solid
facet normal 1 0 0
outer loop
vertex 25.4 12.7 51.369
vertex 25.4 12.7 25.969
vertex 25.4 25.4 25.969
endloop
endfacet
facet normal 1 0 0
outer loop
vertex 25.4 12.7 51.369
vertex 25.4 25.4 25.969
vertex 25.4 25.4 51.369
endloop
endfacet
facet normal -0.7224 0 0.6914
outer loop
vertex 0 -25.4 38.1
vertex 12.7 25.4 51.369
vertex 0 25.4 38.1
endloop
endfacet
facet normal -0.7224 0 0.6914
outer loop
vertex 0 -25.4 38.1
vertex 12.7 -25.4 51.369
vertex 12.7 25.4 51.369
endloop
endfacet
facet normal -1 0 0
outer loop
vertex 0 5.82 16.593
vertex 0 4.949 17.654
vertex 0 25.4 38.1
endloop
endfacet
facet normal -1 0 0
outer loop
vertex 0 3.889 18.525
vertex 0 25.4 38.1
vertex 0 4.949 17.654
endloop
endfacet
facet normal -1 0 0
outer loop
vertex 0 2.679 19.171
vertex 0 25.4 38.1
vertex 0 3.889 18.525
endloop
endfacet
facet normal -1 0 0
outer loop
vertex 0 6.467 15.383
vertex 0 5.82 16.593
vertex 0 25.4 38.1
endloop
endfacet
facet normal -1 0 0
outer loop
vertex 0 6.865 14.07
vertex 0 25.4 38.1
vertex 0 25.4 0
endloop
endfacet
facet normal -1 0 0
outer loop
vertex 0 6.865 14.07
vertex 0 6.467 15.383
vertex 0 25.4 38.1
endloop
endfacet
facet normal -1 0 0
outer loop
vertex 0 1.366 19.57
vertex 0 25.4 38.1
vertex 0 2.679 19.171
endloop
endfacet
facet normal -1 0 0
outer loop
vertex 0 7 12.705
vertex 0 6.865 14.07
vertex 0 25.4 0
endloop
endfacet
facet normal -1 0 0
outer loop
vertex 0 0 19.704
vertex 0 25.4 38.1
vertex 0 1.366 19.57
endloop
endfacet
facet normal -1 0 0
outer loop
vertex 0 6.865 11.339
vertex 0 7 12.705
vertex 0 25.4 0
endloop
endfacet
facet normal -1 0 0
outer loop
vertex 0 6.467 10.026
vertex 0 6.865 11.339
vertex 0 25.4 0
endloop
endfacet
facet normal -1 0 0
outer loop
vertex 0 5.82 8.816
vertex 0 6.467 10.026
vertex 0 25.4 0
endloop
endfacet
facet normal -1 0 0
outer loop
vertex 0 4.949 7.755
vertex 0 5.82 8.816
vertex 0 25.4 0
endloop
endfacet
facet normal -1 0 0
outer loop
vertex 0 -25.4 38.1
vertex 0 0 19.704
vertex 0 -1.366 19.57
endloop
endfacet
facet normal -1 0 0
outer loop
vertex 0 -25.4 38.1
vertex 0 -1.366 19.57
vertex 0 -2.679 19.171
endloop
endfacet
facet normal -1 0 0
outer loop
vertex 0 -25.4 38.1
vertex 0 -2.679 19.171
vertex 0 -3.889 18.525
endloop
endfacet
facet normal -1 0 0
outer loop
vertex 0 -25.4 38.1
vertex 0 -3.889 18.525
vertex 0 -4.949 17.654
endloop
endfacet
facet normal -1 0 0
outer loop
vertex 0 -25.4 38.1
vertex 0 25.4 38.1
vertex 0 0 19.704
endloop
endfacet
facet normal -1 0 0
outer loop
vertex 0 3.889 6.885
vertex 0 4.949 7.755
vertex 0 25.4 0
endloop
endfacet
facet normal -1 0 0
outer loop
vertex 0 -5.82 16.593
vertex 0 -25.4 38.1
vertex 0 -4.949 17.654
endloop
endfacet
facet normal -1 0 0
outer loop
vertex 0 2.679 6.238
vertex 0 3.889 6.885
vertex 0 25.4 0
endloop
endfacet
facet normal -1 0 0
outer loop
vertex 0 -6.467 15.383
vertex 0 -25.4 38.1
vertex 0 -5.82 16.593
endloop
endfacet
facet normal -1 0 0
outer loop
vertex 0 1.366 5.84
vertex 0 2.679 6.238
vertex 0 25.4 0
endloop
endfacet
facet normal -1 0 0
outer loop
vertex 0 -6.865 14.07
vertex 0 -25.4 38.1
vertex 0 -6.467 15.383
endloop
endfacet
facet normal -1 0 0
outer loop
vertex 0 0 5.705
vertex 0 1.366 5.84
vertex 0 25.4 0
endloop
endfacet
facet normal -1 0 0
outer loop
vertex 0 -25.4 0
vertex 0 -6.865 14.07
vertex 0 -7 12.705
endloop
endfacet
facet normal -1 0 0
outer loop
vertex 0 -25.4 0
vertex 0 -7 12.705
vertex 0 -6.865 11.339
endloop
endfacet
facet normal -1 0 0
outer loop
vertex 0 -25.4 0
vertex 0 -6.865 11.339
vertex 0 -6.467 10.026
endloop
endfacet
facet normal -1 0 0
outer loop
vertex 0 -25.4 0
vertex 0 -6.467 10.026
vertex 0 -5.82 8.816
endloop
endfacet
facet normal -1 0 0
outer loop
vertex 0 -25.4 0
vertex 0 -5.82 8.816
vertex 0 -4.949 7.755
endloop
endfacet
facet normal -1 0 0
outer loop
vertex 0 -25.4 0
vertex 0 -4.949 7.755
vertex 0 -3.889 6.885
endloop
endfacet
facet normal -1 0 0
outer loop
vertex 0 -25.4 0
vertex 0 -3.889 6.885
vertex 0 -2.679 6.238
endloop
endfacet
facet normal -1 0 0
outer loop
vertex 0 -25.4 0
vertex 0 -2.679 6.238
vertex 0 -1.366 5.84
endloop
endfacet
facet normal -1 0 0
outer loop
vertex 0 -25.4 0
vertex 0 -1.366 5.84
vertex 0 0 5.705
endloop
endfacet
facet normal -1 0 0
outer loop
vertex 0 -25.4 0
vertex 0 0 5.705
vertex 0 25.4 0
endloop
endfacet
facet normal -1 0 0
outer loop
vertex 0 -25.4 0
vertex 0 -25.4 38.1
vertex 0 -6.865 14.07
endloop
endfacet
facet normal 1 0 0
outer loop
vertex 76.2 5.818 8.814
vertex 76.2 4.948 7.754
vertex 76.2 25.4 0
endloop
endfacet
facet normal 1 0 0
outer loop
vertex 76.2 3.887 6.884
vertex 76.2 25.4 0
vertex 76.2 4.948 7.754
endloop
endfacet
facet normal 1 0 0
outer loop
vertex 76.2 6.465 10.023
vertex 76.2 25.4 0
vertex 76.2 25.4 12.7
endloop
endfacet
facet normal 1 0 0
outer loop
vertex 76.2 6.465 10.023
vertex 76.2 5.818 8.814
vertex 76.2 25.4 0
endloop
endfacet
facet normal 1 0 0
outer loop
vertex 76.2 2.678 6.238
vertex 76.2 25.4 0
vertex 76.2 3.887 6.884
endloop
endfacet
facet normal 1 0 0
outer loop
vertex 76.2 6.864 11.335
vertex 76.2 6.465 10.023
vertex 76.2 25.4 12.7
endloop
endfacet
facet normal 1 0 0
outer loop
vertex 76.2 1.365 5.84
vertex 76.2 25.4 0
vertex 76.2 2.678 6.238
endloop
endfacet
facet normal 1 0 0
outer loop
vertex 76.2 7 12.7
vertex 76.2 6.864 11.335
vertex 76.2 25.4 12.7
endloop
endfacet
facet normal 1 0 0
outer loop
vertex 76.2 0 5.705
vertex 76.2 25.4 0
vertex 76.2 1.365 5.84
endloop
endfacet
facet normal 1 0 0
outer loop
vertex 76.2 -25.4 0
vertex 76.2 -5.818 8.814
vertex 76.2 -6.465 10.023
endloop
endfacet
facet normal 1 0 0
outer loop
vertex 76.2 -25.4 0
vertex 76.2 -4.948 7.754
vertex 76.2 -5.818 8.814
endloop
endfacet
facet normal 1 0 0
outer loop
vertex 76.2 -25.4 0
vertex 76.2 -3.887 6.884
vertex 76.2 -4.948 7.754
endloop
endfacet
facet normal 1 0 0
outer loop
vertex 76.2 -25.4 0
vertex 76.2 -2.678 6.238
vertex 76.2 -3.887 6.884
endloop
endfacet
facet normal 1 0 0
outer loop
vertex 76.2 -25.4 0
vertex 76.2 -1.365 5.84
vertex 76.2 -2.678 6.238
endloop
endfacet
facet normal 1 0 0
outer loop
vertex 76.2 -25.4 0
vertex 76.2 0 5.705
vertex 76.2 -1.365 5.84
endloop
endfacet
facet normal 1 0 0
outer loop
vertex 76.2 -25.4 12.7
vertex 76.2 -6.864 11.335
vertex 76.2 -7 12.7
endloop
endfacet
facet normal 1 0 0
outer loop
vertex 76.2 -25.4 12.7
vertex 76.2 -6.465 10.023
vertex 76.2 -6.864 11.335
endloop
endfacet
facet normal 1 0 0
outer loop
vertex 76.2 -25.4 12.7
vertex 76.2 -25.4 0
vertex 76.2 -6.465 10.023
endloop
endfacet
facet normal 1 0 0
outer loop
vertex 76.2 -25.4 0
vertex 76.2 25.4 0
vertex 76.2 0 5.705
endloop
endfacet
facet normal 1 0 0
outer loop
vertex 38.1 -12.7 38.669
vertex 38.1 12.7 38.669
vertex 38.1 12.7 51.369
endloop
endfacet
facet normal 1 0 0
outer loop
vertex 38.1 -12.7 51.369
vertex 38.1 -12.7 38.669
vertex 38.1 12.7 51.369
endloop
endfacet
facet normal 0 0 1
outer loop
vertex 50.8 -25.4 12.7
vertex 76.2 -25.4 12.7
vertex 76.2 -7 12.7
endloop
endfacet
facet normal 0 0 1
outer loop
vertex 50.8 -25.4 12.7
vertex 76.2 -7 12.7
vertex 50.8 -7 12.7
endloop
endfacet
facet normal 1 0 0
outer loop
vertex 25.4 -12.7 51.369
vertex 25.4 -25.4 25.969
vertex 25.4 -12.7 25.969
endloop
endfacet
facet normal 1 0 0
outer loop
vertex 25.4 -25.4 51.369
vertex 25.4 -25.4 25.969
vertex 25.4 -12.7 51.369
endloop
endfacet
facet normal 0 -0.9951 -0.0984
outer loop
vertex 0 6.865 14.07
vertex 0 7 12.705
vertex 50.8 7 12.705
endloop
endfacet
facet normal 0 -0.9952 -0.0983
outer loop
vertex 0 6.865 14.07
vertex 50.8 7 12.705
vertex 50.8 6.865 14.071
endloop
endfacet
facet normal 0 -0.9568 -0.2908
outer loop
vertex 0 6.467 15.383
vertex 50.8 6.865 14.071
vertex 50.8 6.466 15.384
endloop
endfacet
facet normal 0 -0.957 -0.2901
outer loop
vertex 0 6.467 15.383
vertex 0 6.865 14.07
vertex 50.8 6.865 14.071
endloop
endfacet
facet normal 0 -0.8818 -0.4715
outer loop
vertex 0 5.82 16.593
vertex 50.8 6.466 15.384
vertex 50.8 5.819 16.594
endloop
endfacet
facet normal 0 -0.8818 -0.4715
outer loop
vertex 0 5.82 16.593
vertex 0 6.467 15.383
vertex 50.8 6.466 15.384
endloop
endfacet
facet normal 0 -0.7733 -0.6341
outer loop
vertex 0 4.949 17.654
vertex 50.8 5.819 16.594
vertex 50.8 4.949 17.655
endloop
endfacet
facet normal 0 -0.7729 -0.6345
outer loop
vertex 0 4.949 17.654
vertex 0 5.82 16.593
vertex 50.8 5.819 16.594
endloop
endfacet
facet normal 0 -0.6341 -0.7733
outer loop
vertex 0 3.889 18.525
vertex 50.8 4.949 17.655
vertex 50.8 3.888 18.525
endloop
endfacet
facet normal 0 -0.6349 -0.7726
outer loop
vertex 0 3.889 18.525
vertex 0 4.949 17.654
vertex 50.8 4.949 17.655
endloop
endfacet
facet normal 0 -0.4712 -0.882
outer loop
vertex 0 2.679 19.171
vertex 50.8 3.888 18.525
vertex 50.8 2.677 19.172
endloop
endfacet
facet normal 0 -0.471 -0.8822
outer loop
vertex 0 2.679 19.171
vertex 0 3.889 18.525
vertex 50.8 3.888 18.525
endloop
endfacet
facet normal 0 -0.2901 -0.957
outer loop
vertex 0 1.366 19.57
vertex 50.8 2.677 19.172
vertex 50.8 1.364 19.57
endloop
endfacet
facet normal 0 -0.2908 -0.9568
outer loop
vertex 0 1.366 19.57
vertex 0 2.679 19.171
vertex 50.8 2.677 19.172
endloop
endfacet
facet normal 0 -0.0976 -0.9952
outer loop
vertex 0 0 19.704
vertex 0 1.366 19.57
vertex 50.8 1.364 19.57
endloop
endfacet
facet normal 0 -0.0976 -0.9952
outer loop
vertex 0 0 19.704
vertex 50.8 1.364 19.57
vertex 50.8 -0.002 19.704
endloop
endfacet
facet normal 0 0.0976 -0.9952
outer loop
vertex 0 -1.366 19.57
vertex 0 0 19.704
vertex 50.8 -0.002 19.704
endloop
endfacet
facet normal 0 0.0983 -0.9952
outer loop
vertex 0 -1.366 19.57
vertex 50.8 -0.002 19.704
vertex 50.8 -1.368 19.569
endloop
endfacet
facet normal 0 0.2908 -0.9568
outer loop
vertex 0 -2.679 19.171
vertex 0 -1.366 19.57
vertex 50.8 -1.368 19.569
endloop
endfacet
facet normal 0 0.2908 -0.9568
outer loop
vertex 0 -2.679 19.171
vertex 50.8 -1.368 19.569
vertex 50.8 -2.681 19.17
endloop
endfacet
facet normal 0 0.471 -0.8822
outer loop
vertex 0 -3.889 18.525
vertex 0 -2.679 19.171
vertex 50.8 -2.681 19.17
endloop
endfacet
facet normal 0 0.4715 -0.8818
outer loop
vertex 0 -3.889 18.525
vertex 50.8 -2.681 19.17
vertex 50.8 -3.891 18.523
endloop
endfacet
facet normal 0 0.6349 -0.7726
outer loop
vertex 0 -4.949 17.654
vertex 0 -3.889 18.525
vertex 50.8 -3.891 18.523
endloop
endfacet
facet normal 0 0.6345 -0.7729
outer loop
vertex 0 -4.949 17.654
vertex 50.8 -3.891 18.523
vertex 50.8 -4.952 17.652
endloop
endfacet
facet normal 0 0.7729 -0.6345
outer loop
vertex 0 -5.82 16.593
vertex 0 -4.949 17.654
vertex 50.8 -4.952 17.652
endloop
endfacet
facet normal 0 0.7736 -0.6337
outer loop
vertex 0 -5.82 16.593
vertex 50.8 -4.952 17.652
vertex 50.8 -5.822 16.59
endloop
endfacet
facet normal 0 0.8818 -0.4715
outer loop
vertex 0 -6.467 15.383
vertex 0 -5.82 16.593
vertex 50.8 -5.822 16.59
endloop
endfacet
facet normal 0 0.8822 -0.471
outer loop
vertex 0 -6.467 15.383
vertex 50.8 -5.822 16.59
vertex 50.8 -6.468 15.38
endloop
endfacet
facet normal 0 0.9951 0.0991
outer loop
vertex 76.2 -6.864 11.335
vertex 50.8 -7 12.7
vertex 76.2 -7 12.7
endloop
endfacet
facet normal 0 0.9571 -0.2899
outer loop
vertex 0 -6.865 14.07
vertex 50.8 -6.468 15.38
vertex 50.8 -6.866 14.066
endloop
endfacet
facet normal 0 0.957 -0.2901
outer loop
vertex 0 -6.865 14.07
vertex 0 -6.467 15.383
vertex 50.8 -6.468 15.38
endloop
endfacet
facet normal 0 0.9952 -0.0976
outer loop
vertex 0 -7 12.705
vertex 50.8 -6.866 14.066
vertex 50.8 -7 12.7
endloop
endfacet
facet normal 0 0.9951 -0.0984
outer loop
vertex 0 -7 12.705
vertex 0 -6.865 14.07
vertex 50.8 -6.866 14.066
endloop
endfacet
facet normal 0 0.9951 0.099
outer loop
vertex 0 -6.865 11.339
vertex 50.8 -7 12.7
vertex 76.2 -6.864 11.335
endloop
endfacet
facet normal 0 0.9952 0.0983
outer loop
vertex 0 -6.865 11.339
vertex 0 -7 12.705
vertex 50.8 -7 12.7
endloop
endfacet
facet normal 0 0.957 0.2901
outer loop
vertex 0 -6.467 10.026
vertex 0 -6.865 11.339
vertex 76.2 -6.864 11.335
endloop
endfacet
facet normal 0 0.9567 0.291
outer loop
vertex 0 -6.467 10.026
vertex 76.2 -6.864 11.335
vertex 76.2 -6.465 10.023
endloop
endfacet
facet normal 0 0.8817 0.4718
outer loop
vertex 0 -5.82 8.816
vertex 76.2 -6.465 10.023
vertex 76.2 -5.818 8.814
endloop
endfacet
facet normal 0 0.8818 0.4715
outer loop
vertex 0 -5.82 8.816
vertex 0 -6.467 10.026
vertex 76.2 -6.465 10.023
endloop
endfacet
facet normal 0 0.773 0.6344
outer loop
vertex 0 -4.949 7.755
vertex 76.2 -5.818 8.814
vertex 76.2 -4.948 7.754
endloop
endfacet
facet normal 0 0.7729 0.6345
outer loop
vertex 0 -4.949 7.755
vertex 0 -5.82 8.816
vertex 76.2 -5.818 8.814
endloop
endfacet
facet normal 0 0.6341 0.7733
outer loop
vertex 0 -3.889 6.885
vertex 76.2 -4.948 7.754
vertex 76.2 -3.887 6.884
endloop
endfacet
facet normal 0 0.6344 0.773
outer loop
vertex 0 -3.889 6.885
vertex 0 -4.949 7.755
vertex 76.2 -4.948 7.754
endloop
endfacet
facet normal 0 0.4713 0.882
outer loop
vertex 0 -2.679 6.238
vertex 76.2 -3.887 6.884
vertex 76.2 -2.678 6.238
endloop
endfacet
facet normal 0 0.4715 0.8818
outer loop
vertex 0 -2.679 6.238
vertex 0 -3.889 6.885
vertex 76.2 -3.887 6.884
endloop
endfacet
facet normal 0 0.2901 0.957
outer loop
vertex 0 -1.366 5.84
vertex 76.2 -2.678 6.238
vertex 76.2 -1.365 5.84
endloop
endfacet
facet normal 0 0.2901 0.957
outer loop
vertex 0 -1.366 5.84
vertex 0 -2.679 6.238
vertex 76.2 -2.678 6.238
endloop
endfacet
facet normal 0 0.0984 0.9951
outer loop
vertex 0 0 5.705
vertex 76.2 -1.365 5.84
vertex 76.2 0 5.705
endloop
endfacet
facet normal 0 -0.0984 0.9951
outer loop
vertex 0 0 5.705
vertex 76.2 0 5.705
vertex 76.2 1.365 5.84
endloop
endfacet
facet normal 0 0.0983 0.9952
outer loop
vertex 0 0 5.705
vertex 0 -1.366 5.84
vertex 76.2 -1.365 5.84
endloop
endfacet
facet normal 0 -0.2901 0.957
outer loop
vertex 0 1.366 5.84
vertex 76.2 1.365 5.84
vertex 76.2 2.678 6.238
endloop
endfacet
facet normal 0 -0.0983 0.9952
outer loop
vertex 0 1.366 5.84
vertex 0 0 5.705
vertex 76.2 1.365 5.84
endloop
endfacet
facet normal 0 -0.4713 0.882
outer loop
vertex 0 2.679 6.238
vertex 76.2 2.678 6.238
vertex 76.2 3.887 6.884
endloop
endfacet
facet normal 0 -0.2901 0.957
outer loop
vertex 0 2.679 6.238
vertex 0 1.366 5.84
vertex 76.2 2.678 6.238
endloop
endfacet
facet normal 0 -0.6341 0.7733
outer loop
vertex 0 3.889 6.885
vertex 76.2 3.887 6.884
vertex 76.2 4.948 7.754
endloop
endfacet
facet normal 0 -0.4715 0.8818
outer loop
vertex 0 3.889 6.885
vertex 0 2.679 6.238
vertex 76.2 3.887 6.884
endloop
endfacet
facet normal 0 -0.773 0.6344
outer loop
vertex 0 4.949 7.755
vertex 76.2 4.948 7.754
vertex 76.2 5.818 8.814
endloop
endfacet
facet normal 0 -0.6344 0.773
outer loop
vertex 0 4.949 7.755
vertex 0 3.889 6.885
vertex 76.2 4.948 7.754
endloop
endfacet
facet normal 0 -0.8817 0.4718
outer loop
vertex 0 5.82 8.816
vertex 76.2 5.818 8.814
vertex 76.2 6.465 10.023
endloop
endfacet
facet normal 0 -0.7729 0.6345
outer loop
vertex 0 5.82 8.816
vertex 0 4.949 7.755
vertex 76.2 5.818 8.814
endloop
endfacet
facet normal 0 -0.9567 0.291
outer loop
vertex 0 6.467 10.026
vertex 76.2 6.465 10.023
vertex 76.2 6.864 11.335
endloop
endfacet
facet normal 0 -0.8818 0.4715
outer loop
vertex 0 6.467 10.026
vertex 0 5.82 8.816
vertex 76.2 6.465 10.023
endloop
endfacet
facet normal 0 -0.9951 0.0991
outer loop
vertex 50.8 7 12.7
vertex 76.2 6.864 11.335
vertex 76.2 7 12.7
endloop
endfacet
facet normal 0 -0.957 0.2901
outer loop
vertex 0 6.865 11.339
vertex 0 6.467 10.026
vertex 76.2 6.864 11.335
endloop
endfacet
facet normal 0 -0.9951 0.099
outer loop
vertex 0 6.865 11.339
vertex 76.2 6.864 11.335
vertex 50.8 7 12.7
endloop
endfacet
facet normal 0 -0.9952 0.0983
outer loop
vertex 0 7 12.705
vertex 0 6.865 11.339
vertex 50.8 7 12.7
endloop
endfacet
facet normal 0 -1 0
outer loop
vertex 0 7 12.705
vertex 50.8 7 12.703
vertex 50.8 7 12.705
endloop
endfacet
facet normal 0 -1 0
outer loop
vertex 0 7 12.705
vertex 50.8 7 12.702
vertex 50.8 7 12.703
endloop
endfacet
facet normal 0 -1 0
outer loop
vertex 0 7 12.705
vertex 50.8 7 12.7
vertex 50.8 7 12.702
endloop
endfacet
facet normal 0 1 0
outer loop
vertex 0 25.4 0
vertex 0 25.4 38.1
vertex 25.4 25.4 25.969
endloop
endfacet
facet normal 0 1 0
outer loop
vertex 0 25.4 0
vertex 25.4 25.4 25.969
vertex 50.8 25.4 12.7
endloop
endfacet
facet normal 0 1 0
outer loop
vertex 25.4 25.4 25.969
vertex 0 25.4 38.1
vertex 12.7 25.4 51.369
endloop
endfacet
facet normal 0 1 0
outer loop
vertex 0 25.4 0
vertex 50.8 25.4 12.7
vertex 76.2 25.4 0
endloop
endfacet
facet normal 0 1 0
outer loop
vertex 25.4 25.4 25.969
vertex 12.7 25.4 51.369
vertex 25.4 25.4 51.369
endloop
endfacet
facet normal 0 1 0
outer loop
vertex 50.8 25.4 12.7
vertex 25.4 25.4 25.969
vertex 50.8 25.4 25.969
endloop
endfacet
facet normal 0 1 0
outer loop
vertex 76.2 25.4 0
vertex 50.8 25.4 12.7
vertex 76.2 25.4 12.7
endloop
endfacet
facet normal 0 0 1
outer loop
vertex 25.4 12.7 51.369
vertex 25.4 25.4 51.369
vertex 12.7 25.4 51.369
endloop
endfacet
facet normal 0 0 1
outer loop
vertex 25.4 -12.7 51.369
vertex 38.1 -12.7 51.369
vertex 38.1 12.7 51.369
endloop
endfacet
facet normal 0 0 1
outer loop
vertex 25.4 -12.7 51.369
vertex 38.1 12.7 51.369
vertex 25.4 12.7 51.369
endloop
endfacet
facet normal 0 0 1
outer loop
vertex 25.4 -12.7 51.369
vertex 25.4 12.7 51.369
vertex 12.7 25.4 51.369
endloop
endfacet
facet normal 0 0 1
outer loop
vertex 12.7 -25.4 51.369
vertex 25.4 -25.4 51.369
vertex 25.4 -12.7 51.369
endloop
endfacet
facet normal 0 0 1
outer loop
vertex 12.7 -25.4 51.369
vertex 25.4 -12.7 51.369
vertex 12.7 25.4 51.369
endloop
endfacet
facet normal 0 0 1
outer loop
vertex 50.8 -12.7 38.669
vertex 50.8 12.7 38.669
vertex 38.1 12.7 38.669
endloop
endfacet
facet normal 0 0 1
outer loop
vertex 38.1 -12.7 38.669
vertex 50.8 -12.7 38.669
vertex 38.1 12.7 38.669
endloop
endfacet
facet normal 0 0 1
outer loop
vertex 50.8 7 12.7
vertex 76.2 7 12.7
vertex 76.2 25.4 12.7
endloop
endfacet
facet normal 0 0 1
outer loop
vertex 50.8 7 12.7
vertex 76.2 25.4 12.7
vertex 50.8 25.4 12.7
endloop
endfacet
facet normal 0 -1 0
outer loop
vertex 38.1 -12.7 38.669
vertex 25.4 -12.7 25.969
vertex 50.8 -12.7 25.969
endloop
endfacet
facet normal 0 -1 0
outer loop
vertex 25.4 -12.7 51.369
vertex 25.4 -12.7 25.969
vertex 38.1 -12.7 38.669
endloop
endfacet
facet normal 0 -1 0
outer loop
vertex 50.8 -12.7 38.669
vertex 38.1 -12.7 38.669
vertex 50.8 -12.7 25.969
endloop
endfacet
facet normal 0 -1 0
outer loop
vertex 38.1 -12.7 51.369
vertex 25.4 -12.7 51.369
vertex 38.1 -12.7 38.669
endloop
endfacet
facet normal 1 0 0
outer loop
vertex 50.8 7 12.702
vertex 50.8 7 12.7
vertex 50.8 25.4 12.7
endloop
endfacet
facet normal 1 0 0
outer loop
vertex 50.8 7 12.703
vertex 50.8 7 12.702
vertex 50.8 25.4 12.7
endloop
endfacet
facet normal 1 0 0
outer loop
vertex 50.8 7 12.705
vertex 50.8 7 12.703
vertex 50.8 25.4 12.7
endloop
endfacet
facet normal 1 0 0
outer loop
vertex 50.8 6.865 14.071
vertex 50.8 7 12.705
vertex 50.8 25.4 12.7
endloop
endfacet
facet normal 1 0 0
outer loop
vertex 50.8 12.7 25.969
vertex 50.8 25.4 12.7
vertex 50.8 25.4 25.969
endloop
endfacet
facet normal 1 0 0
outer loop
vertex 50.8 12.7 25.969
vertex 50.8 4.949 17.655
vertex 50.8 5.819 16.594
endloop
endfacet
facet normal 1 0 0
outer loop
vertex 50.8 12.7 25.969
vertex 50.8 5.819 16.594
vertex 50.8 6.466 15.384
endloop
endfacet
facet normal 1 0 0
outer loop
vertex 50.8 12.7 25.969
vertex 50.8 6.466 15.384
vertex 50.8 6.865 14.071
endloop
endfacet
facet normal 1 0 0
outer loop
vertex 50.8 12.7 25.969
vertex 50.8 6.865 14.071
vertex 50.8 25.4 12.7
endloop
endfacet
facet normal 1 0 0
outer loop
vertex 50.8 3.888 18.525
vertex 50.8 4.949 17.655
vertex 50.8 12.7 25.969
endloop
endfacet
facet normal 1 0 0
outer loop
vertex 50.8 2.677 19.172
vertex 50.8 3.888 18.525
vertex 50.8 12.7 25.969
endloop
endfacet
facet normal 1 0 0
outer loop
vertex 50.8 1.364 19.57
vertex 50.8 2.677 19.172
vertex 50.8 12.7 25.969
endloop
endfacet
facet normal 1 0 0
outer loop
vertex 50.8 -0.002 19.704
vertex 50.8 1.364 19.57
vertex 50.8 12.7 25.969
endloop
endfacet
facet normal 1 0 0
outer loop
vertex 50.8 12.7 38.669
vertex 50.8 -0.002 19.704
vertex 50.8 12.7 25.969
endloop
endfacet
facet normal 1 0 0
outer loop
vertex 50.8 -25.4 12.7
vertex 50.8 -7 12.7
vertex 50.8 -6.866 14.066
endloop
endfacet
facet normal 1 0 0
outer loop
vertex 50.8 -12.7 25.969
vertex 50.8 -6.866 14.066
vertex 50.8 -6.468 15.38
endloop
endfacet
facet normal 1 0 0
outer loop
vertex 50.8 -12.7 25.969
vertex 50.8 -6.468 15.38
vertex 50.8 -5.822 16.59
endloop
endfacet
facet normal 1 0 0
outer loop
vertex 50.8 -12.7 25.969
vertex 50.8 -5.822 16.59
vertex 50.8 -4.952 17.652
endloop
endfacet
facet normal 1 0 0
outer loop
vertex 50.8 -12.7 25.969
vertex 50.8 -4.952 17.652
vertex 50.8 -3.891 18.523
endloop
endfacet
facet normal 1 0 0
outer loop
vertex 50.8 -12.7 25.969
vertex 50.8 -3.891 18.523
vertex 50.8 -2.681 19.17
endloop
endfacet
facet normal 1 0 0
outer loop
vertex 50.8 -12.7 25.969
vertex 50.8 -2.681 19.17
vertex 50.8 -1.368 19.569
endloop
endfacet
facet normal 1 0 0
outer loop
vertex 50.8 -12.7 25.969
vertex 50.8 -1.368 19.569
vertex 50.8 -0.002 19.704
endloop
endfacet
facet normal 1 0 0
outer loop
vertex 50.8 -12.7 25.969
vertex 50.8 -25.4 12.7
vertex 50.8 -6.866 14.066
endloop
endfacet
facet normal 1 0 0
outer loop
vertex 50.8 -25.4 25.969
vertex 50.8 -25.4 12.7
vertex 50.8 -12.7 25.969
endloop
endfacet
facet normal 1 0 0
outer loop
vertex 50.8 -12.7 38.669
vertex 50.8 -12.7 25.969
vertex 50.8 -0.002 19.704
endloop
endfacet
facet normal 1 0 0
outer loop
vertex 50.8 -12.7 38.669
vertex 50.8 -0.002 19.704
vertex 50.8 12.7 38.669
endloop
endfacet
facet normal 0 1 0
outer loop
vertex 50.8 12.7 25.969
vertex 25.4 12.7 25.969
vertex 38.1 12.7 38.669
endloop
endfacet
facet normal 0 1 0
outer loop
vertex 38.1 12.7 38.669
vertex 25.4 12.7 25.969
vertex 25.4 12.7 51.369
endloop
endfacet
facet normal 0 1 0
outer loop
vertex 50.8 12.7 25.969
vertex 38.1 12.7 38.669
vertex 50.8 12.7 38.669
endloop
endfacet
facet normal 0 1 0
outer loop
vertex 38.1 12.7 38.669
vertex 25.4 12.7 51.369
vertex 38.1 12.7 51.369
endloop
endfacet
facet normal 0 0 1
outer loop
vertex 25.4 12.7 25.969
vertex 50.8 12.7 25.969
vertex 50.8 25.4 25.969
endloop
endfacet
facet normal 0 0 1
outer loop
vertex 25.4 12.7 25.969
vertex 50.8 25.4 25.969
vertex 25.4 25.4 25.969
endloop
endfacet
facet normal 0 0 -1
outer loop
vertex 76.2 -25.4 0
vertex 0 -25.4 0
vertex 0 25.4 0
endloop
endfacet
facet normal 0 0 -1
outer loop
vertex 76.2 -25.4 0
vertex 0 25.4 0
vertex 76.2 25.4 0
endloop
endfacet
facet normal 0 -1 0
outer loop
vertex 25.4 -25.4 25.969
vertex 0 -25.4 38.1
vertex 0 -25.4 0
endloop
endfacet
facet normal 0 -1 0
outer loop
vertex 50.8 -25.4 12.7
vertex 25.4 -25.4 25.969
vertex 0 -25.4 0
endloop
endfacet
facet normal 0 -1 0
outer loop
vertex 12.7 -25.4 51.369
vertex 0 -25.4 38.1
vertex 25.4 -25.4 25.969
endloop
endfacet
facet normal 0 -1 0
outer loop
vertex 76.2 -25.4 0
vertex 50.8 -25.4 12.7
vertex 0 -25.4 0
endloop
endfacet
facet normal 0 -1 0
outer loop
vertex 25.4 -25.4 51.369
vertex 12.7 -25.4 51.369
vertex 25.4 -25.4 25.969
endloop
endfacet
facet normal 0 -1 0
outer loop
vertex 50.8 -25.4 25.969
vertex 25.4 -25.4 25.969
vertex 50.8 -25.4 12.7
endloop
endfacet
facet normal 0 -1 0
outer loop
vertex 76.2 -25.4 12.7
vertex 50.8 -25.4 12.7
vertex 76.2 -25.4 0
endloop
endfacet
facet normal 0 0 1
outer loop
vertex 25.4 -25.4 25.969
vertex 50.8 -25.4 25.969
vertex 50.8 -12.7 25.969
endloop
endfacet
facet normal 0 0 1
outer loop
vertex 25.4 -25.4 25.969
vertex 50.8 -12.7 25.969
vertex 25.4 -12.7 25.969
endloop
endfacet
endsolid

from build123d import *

# Parameters (mm, degrees)
F1_DEPTH = 25.4
F2_DEPTH = 12.7
F3_R     = 6.999522
F4_DEPTH = 76.2


with BuildPart() as f1:
    # F0 (on Front) → F1 (new body, symmetric)
    with BuildSketch(Plane.XZ):
        Polygon((0, 38.1), (0, 0), (76.2, 0), (76.2, 12.7), (50.8, 12.7), (50.8, 25.969388), (25.4, 25.969388), (25.4, 51.369388), (12.7, 51.369388), align=None)
    extrude(amount=F1_DEPTH, both=True)

    # F0 (on Front) → F2 (join, symmetric)
    with BuildSketch(Plane.XZ):
        Polygon((38.1, 51.369388), (25.4, 51.369388), (25.4, 25.969388), (50.8, 25.969388), (50.8, 38.669388), (38.1, 38.669388), align=None)
    extrude(amount=F2_DEPTH, both=True)

    # F3 (on Right) → F4 (cut)
    with BuildSketch(Plane.YZ):
        with Locations((0, 12.7047)):
            Circle(F3_R)
    extrude(amount=F4_DEPTH, mode=Mode.SUBTRACT)


solid = f1.part
